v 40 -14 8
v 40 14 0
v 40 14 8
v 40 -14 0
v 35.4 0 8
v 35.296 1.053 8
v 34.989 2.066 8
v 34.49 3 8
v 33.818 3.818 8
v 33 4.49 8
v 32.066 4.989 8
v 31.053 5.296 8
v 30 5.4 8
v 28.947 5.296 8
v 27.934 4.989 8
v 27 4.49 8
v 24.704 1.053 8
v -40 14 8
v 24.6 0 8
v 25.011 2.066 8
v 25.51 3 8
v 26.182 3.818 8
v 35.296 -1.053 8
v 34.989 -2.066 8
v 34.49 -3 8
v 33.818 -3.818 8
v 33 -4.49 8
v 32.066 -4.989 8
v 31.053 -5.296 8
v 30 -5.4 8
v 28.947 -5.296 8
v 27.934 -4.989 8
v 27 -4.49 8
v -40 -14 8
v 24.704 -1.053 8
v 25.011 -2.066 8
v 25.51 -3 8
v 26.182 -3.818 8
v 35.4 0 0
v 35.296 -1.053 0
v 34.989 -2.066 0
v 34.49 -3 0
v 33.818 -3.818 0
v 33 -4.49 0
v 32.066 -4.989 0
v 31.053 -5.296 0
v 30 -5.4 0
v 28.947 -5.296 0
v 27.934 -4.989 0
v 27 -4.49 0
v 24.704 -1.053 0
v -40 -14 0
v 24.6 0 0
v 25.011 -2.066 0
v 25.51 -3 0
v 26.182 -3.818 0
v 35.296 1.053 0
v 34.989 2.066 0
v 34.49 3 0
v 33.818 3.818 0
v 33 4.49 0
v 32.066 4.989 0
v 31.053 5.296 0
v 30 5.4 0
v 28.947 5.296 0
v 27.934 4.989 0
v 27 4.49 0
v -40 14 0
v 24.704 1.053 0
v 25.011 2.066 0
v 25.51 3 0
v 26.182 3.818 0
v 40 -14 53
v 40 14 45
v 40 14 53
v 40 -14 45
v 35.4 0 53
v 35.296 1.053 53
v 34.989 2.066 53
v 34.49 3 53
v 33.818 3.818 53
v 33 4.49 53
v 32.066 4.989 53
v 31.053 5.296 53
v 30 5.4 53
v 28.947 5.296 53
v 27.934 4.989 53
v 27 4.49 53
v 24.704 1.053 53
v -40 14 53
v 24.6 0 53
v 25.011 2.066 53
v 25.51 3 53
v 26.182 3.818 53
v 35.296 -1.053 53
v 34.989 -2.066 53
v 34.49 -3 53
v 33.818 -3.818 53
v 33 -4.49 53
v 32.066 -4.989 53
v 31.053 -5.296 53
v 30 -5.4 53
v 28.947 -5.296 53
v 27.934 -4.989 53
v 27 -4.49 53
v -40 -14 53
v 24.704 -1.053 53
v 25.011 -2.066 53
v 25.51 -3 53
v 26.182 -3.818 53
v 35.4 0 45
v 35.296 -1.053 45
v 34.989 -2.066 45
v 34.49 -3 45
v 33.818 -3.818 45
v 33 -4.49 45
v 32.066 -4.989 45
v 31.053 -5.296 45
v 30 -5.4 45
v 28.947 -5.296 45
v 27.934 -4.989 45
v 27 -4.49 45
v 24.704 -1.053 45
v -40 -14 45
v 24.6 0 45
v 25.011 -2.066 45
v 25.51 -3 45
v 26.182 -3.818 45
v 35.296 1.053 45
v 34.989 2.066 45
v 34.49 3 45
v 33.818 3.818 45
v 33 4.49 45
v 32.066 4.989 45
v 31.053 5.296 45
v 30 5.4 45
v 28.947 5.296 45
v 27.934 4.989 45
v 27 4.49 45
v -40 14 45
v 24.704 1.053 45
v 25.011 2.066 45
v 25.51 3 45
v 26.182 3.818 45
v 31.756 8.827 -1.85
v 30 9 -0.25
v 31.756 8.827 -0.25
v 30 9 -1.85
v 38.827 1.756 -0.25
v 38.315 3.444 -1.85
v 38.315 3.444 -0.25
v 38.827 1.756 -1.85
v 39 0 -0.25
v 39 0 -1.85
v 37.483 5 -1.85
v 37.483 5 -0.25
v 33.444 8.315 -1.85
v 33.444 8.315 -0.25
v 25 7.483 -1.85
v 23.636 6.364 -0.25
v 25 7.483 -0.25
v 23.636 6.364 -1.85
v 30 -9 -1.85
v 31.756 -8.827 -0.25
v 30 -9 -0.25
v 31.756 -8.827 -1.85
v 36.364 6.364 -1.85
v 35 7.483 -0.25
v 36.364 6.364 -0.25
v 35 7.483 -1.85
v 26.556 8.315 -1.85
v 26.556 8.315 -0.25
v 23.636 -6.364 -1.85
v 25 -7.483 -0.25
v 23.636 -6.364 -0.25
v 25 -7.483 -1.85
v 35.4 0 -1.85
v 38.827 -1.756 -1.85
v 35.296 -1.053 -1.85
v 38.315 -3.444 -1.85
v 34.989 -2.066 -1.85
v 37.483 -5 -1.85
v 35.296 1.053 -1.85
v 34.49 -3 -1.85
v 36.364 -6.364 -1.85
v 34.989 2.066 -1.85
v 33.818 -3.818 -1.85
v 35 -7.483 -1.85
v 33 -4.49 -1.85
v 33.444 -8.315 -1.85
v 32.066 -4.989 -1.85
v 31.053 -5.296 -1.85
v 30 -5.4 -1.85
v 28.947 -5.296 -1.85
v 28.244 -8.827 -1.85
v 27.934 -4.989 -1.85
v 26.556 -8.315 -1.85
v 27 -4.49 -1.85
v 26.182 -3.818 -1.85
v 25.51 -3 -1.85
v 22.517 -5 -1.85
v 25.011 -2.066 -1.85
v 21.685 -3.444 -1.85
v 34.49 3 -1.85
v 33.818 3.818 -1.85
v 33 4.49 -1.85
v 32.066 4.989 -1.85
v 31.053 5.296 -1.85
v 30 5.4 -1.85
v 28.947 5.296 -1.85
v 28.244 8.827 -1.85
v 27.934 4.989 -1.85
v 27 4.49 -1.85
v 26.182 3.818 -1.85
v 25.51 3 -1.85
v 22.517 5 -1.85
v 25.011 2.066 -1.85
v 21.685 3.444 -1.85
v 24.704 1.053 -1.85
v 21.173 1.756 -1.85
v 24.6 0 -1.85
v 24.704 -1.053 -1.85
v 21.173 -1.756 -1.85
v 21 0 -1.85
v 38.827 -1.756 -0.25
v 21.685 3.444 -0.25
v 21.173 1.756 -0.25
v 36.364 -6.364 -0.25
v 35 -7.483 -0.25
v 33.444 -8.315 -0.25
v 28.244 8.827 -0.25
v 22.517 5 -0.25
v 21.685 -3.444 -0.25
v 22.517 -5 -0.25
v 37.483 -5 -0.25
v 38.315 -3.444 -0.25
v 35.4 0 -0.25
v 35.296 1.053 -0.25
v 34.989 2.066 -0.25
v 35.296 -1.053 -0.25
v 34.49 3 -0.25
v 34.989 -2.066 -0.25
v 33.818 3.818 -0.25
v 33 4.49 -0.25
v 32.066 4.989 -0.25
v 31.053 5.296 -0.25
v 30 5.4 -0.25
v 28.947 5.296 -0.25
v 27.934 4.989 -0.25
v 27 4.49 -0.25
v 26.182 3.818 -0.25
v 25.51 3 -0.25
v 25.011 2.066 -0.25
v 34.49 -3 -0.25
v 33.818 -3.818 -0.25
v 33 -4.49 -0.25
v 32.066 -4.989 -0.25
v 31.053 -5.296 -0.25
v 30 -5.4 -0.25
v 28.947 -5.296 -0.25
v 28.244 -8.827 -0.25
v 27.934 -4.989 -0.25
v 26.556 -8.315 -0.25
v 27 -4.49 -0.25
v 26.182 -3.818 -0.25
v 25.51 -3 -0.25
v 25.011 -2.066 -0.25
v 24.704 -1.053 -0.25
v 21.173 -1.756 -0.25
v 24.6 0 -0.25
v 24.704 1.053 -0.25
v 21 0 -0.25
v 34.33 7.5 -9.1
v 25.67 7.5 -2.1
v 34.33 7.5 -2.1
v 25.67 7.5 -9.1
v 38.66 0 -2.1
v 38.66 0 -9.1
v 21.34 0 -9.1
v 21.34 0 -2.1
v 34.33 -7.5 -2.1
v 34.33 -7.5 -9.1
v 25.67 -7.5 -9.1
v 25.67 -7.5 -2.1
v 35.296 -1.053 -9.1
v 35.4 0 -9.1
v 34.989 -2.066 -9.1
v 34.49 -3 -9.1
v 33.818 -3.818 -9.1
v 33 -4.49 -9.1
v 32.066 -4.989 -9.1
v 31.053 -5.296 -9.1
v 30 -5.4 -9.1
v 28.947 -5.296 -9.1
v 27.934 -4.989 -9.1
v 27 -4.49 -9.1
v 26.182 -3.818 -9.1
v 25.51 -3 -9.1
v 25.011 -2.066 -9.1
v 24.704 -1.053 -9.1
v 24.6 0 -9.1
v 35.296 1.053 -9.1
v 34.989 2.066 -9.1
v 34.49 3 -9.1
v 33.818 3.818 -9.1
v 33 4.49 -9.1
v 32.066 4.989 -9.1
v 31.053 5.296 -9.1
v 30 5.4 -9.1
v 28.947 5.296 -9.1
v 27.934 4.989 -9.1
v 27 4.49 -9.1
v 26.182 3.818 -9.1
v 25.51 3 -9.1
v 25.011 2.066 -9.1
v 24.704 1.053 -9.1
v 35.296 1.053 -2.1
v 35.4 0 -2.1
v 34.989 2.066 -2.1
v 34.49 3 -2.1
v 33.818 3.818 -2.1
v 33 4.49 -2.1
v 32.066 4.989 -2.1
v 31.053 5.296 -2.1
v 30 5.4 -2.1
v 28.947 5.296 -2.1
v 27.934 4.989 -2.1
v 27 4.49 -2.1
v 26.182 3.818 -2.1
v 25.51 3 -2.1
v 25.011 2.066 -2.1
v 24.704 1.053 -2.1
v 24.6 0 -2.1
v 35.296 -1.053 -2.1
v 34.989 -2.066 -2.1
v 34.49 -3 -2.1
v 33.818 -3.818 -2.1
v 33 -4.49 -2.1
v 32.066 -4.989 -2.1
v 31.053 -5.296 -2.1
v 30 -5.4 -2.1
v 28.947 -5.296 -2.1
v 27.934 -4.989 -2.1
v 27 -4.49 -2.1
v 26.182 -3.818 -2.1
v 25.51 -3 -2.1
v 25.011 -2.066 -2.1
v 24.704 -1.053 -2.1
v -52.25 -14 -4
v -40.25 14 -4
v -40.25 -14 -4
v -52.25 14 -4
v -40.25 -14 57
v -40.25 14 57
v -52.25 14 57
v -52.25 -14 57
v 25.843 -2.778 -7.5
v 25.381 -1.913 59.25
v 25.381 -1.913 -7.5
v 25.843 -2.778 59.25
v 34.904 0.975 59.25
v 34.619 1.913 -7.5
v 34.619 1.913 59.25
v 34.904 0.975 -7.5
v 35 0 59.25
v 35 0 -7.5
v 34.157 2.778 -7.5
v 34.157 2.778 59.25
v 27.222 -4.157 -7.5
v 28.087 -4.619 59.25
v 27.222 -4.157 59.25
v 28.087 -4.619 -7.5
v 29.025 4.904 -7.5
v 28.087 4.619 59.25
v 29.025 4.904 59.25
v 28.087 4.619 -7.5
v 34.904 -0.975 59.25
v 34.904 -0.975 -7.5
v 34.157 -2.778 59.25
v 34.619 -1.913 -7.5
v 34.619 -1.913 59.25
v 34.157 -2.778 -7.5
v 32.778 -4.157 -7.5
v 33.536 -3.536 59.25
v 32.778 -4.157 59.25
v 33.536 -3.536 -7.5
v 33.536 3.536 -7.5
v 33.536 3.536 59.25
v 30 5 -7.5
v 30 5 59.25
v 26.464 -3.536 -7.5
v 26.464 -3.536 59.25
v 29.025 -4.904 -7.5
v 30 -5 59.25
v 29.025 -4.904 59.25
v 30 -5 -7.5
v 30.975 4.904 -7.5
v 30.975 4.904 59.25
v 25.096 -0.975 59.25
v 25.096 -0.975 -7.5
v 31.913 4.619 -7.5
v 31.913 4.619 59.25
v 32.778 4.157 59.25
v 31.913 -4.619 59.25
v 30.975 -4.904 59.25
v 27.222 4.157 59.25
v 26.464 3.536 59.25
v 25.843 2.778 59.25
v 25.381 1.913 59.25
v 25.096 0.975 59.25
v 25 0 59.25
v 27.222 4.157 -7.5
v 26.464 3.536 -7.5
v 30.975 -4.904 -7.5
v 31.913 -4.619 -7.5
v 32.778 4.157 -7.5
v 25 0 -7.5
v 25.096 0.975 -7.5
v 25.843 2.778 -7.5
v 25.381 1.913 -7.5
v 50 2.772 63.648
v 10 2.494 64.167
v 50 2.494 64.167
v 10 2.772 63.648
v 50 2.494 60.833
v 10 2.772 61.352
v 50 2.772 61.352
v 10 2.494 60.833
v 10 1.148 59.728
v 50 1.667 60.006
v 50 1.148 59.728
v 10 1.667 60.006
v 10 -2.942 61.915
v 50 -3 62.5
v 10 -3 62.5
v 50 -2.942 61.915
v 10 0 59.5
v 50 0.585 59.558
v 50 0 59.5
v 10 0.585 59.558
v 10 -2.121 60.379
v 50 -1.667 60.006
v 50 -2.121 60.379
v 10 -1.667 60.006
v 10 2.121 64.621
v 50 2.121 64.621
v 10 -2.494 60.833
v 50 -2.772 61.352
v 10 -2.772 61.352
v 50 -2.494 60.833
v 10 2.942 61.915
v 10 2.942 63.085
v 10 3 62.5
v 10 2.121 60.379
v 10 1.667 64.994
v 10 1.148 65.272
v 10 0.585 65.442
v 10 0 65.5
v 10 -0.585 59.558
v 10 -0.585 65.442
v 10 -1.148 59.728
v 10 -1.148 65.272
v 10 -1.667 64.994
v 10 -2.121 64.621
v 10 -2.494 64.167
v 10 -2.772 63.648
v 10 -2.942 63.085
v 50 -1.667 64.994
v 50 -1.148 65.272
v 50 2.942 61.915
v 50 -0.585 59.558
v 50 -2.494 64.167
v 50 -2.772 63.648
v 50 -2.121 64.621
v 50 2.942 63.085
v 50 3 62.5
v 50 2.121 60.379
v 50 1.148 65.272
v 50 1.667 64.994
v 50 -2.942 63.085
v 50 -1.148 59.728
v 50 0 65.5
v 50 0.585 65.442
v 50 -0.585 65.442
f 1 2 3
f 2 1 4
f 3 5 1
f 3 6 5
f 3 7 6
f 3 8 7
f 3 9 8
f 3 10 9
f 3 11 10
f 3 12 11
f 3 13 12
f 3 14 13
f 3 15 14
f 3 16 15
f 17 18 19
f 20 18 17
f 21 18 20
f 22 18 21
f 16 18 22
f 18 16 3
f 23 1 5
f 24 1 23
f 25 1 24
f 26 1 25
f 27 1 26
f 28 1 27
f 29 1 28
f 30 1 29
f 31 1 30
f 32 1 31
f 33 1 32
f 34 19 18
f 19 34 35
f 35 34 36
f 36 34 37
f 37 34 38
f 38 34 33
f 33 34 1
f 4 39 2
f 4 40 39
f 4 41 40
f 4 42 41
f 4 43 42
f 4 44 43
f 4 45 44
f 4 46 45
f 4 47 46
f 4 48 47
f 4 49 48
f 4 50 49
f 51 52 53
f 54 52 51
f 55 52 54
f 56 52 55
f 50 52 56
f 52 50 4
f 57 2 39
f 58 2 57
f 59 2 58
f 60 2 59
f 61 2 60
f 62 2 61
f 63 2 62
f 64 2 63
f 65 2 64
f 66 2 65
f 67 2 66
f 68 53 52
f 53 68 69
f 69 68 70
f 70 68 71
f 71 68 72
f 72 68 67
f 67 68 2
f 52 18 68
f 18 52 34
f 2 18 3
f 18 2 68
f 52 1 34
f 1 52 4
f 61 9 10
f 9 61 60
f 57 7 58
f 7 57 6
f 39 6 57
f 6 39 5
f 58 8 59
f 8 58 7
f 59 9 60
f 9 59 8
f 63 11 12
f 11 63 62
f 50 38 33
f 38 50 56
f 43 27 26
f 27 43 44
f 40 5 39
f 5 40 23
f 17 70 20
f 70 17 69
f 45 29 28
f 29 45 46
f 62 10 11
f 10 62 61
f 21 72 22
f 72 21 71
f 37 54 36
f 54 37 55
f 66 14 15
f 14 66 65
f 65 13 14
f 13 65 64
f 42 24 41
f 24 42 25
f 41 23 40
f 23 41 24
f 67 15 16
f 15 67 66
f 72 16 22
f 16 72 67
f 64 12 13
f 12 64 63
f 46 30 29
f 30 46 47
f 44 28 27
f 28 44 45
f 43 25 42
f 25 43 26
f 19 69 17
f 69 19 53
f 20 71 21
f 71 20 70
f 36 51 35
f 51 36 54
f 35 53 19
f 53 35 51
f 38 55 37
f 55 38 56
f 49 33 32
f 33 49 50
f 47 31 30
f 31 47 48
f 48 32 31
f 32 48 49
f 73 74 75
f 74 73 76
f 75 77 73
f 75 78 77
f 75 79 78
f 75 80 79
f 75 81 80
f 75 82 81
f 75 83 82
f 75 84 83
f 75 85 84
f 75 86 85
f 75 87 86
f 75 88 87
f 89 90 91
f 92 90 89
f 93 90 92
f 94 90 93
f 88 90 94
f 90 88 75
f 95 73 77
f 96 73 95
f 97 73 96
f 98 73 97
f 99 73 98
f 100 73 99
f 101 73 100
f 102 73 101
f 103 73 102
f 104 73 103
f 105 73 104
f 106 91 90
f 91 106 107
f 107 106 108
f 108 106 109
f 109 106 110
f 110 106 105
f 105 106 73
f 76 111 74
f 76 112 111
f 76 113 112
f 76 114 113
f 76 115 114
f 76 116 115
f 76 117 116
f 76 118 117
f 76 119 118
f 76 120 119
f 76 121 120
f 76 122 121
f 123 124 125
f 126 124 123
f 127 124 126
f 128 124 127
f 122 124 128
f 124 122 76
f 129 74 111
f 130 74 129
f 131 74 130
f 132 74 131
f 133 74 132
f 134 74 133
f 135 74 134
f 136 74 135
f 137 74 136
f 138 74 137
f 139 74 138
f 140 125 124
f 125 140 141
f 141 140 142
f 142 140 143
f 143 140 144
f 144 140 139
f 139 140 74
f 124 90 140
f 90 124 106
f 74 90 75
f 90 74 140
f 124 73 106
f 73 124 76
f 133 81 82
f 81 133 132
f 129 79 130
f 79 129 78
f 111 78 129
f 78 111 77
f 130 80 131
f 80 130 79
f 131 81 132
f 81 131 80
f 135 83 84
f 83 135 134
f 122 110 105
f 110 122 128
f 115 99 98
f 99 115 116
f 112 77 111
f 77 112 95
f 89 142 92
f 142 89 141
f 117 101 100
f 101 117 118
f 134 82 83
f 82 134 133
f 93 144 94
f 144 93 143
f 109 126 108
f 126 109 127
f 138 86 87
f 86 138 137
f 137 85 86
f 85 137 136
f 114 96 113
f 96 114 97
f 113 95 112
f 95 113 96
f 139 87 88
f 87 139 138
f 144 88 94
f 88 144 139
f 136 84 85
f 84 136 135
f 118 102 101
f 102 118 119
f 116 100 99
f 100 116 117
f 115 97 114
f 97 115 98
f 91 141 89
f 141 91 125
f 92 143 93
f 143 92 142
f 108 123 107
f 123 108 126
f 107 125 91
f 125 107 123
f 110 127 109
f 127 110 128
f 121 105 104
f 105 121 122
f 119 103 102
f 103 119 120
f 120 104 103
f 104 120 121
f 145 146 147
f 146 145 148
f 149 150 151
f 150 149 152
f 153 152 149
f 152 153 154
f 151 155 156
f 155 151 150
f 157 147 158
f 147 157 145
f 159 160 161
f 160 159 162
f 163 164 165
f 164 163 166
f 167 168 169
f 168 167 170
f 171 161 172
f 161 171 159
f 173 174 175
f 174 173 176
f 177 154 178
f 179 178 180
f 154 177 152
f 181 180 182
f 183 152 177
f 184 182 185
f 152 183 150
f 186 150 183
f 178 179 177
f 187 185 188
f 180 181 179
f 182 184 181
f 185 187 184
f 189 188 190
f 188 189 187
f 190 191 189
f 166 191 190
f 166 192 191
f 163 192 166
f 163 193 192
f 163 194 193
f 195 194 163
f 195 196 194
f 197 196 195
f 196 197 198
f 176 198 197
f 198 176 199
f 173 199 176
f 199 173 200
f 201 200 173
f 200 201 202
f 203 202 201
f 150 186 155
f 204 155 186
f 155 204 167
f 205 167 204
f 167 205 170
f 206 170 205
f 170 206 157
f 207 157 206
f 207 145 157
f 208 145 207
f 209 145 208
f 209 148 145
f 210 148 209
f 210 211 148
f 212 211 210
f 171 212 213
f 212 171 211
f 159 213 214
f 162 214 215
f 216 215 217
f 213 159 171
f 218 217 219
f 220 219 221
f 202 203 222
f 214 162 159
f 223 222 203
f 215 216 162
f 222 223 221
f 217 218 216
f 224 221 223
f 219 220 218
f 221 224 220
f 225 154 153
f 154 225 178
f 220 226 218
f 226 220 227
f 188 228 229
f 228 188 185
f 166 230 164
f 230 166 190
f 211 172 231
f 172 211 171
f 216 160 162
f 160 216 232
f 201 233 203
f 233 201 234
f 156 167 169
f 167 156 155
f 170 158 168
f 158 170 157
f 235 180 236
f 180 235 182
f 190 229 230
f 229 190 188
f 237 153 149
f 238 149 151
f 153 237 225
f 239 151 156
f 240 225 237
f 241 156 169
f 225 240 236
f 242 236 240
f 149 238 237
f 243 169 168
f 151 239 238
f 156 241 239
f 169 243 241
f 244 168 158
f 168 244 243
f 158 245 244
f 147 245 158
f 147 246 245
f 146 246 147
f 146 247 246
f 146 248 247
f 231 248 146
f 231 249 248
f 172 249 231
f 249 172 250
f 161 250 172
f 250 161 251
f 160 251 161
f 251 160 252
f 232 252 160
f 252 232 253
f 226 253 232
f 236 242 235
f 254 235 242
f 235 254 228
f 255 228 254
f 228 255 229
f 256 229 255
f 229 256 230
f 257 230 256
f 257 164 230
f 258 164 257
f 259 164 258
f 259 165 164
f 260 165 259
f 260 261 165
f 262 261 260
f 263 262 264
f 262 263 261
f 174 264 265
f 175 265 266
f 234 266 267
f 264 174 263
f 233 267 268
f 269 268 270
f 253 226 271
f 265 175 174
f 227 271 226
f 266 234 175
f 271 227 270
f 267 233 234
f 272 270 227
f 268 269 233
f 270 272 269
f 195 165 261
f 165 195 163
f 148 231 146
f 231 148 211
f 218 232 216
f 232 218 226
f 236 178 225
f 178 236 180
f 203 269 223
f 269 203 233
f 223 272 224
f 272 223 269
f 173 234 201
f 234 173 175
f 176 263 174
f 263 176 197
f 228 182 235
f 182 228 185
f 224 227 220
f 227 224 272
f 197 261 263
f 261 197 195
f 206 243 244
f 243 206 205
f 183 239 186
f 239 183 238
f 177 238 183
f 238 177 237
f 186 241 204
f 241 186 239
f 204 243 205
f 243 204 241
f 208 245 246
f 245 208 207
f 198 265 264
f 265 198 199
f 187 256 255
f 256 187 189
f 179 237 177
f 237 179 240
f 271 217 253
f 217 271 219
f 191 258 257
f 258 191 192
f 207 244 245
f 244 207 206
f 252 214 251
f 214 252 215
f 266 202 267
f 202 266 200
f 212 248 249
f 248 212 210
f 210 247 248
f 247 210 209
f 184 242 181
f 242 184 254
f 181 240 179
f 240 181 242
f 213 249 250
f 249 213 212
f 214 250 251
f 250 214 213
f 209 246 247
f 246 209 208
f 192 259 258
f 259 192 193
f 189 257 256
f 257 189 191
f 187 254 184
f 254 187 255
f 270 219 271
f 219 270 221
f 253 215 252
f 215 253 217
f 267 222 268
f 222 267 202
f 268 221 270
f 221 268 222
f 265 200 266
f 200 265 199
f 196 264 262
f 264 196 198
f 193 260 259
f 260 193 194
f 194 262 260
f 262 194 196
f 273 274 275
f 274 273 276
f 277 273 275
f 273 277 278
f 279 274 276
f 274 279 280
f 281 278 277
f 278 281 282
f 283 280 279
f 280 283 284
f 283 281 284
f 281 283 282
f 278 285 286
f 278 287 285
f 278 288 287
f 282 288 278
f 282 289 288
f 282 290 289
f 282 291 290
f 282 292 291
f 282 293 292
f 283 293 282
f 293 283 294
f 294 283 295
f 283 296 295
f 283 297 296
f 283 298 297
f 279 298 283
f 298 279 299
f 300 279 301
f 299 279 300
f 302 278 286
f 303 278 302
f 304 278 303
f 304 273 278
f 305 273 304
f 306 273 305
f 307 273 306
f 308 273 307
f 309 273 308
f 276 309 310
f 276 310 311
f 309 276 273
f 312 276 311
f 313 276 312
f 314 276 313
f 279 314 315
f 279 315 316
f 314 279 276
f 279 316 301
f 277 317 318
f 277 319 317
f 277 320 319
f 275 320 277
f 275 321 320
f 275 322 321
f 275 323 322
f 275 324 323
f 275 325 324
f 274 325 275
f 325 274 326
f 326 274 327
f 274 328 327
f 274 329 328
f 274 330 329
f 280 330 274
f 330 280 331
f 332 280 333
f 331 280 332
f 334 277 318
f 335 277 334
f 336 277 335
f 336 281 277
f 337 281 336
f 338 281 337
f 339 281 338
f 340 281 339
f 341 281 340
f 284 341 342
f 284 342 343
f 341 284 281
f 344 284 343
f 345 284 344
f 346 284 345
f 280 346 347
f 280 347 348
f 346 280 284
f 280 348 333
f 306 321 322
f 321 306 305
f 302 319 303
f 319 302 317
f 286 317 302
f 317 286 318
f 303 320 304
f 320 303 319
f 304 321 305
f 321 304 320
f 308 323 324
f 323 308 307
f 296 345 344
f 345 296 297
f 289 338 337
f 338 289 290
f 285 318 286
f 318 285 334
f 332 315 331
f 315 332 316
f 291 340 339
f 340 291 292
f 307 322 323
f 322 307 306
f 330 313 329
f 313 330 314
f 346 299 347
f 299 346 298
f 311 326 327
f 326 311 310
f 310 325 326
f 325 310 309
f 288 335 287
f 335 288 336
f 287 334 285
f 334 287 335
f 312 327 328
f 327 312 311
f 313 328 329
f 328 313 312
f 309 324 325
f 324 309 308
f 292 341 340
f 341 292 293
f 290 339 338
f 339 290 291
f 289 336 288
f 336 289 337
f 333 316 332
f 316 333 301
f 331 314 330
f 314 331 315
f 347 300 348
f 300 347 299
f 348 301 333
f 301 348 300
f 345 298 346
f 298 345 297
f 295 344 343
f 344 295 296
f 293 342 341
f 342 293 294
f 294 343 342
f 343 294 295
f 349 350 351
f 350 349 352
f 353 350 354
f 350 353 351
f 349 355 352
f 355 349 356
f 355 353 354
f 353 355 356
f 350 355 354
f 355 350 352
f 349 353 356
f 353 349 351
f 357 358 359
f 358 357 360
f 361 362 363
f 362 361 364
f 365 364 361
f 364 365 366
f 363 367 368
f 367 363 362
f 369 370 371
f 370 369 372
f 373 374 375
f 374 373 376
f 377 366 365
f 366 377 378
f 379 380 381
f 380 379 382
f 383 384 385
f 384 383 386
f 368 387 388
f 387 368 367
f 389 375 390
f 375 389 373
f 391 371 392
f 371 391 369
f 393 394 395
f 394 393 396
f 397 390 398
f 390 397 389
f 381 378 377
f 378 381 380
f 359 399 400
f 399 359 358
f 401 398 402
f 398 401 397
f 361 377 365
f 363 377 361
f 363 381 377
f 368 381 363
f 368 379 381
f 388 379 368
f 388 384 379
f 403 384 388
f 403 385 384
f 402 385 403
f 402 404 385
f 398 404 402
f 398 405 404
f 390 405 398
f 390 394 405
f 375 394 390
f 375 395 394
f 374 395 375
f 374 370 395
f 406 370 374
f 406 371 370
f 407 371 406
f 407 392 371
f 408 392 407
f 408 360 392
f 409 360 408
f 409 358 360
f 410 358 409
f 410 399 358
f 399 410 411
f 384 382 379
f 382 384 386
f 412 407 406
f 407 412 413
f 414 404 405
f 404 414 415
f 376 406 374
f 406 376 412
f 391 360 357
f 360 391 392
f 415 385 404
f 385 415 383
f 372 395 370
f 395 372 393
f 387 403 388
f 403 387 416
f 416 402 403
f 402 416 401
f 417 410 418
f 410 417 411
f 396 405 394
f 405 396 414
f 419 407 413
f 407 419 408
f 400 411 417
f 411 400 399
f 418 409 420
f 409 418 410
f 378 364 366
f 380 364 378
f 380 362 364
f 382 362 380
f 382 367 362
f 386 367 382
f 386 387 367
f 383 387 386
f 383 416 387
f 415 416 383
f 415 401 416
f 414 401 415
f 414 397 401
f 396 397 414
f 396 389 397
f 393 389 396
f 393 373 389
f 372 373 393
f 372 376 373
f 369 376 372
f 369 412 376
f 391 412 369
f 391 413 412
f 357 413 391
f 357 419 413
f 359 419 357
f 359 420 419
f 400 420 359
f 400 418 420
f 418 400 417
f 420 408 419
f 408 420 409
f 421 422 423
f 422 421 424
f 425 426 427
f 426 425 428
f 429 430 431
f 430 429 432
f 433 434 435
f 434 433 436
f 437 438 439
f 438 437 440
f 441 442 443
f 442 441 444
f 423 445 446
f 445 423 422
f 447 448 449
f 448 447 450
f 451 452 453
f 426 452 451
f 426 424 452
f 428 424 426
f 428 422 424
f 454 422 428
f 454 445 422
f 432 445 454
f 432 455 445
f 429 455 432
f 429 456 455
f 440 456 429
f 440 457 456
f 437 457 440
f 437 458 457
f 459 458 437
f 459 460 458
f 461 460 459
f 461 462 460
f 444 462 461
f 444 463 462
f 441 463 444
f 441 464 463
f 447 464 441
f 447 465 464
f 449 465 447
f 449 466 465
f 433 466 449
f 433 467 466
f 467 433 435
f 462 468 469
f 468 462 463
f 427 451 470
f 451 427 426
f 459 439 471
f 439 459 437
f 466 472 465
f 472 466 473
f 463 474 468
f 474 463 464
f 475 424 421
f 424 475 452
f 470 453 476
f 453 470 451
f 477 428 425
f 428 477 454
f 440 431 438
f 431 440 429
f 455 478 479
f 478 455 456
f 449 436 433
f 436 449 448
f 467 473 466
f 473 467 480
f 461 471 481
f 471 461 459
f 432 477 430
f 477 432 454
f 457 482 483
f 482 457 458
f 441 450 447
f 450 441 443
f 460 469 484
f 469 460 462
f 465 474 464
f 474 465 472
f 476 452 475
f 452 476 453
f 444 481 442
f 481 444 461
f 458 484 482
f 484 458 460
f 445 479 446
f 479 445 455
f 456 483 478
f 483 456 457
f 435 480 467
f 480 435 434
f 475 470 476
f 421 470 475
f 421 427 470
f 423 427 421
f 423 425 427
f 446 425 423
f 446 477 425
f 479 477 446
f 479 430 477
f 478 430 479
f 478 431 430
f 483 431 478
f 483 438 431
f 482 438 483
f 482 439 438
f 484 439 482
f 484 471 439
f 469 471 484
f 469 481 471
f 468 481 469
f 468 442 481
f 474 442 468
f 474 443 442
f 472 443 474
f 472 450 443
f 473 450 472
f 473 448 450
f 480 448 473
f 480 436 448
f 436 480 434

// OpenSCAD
$fn = 32;

// ------------------------------------------------------------------------
// C clamp: throat 45 mm, screw d10
// Every part is its own module, assembly() places every instance.
// ------------------------------------------------------------------------

// --- part 1 ---
module clamp_arm() {
  difference() {
    translate([-40, -14, 0]) cube([80, 28, 8]);
    translate([30, 0, -1]) cylinder(h = 10, d = 10.8);
  }
}

// --- part 2 ---
module clamp_spine() {
  difference() {
    translate([-30.5, -14, 0]) cube([61, 28, 12]);
  }
}

// --- part 3 ---
module clamp_screw() {
  translate([0, 0, -33.375]) cylinder(h = 66.75, d = 10);
}

// --- part 4 ---
module clamp_washer() {
  difference() {
      translate([0, 0, 0]) cylinder(h = 1.6, d = 18);
      translate([0, 0, -1]) cylinder(h = 3.6, d = 10.8);
    }
}

// --- part 5 ---
module clamp_nut() {
  difference() {
    linear_extrude(height = 7) polygon(points = [[8.66, 0], [4.33, 7.5], [-4.33, 7.5], [-8.66, 0], [-4.33, -7.5], [4.33, -7.5]]);
    translate([0, 0, -1]) cylinder(h = 9, d = 10.8);
  }
}

// --- part 6 ---
module tommy_bar() {
  translate([0, 0, -20]) cylinder(h = 40, d = 6);
}

// --- assembly ---
module assembly() {
  color([0.80, 0.24, 0.20]) translate([0, 0, 0]) rotate([0, 0, 0]) clamp_arm();
  color([0.20, 0.45, 0.75]) translate([0, 0, 45]) rotate([0, 0, 0]) clamp_arm();
  color([0.25, 0.62, 0.32]) translate([-52.25, 0, 26.5]) rotate([0, 90, 0]) clamp_spine();
  color([0.92, 0.70, 0.18]) translate([30, 0, 25.875]) rotate([0, 0, 0]) clamp_screw();
  color([0.58, 0.35, 0.70]) translate([30, 0, -1.85]) rotate([0, 0, 0]) clamp_washer();
  color([0.16, 0.66, 0.66]) translate([30, 0, -9.1]) rotate([0, 0, 0]) clamp_nut();
  color([0.85, 0.48, 0.18]) translate([30, 0, 62.5]) rotate([0, 90, 0]) tommy_bar();
}

assembly();
